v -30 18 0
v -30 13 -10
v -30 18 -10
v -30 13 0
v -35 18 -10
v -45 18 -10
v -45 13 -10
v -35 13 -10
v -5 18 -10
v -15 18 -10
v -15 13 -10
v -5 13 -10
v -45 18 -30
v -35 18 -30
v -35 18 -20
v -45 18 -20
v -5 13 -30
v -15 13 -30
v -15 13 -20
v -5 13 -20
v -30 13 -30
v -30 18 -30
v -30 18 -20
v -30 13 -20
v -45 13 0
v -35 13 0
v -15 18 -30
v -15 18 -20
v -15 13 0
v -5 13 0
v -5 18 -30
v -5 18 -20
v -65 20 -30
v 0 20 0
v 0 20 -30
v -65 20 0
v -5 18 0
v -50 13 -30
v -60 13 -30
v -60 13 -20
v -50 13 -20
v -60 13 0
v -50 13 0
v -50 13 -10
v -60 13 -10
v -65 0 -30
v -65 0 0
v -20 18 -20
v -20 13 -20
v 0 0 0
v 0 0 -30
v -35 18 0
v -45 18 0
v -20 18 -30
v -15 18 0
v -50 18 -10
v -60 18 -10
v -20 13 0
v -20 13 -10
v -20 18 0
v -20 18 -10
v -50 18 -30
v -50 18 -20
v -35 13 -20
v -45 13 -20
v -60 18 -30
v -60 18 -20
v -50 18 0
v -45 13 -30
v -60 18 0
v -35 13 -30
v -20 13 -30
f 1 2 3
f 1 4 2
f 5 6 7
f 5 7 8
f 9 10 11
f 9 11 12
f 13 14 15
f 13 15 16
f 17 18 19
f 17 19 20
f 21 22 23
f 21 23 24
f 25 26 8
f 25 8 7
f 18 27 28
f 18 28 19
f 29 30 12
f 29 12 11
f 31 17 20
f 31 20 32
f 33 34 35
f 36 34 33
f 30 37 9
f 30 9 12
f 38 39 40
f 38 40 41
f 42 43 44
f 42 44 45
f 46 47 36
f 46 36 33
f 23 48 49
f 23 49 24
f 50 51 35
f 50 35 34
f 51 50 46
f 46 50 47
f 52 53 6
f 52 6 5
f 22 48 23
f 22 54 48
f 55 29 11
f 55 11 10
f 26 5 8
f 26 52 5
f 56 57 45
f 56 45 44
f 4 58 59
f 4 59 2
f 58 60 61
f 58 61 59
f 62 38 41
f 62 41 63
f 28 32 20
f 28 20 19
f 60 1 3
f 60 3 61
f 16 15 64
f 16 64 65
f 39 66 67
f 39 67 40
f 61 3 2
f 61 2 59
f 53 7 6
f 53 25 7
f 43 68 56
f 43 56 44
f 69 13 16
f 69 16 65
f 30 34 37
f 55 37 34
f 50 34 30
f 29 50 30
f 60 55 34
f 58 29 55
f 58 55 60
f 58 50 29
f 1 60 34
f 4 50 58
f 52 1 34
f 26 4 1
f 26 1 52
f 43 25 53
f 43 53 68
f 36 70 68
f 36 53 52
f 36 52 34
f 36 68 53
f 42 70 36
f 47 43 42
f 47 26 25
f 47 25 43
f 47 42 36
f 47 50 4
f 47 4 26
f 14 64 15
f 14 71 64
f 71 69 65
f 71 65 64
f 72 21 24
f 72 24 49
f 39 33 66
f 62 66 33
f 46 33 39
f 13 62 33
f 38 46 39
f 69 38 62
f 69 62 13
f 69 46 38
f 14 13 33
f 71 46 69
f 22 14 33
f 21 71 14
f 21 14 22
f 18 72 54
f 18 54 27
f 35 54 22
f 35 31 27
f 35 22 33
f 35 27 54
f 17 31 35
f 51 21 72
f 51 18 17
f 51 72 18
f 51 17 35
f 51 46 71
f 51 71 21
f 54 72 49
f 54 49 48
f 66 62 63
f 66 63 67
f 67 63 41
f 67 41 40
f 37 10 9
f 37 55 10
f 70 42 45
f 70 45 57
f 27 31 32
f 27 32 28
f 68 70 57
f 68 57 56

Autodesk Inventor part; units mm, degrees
ref_plane "YZ Plane" through (0, 0, 0) normal (1, 0, 0) x (0, 1, 0)
ref_plane "XZ Plane" through (0, 0, 0) normal (0, 1, 0) x (-1, 0, 0)
sketch "Sketch1" plane through (0, 0, 0) normal (0, 1, 0) x (-1, 0, 0)
  line L0 (0, 0) -> (65, 0)
  line L1 (65, 0) -> (65, -30)
  line L2 (65, -30) -> (0, -30)
  line L3 (0, -30) -> (0, 0)
  dimension "d0" = 65
  dimension "d1" = 30
extrude "Extrusion1" add sketch "Sketch1" along normal blind 20
sketch "Sketch2" plane through (-65, 0, 0) normal (0, 0, 1) x (1, 0, 0)
  line L0 (5, 18) -> (15, 18)
  line L1 (15, 18) -> (15, 13)
  line L2 (15, 13) -> (5, 13)
  line L3 (5, 13) -> (5, 18)
  line L4 (0, 0) -> (65, 0) projected
  line L5 (30, 18) -> (30, 13)
  line L6 (30, 13) -> (20, 13)
  line L7 (20, 13) -> (20, 18)
  line L8 (20, 18) -> (30, 18)
  line L9 (45, 18) -> (45, 13)
  line L10 (45, 13) -> (35, 13)
  line L11 (35, 13) -> (35, 18)
  line L12 (35, 18) -> (45, 18)
  line L13 (60, 18) -> (60, 13)
  line L14 (60, 13) -> (50, 13)
  line L15 (50, 13) -> (50, 18)
  line L16 (50, 18) -> (60, 18)
  dimension "d4" = 10
  dimension "d5" = 5
  dimension "d6" = 13
  dimension "d7" = 5
  dimension "d10" = 15
extrude "Extrusion2" cut sketch "Sketch2" against normal blind 10
ref_plane "Work Plane1" through (-65, 0, -15) normal (0, 0, 1) x (1, 0, 0)
mirror "Mirror1" about plane through (-65, 0, -15) normal (0, 0, 1) of "Extrusion2"
properties part number "Relay"
